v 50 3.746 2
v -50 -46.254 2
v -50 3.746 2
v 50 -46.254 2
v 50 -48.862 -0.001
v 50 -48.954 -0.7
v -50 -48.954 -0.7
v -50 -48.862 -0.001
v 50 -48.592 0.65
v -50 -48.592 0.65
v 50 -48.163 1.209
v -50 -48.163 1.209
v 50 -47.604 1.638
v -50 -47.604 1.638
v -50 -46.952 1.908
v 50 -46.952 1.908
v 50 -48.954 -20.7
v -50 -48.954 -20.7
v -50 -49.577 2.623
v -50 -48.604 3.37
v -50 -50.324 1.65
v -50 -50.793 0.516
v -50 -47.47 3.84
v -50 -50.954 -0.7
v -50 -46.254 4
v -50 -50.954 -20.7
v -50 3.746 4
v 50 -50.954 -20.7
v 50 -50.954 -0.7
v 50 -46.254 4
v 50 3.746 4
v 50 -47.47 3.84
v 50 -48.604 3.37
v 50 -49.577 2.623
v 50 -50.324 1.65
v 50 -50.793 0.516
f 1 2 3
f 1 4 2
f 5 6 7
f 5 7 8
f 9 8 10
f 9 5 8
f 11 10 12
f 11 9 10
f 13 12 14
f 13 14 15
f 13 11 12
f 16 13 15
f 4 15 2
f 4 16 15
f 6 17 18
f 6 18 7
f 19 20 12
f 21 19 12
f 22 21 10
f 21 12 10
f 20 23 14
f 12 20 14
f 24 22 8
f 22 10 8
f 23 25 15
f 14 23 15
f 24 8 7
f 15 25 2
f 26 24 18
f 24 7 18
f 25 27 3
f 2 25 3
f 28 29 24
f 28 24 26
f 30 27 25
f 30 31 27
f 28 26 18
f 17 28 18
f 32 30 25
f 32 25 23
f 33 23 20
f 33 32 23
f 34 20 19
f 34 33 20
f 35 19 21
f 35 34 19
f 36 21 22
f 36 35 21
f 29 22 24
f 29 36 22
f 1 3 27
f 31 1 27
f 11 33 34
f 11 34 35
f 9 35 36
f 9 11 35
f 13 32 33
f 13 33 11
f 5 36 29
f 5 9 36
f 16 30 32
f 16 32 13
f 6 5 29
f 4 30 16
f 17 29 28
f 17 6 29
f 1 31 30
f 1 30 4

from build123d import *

# Parameters (mm, degrees)
BOSS_EXTRUDE1_DEPTH = 50


with BuildPart() as part:
    # Sketch1 → Boss-Extrude1 (new, symmetric)
    with BuildSketch(Plane(origin=(0, 0, 0), x_dir=(0, 0, -1), z_dir=(1, 0, 0))):
        with BuildLine():
            Line((-4, 3.746468452), (-4, -46.253531548))
            ThreePointArc((-4, -46.253531548), (-2.623401872, -49.57693342), (0.7, -50.953531548))
            Line((0.7, -50.953531548), (20.7, -50.953531548))
            Line((20.7, -50.953531548), (20.7, -48.953531548))
            Line((20.7, -48.953531548), (0.7, -48.953531548))
            ThreePointArc((0.7, -48.953531548), (-1.209188309, -48.162719858), (-2, -46.253531548))
            Line((-2, -46.253531548), (-2, 3.746468452))
            Line((-2, 3.746468452), (-4, 3.746468452))
        make_face()
    extrude(amount=BOSS_EXTRUDE1_DEPTH, both=True)


solid = part.part
